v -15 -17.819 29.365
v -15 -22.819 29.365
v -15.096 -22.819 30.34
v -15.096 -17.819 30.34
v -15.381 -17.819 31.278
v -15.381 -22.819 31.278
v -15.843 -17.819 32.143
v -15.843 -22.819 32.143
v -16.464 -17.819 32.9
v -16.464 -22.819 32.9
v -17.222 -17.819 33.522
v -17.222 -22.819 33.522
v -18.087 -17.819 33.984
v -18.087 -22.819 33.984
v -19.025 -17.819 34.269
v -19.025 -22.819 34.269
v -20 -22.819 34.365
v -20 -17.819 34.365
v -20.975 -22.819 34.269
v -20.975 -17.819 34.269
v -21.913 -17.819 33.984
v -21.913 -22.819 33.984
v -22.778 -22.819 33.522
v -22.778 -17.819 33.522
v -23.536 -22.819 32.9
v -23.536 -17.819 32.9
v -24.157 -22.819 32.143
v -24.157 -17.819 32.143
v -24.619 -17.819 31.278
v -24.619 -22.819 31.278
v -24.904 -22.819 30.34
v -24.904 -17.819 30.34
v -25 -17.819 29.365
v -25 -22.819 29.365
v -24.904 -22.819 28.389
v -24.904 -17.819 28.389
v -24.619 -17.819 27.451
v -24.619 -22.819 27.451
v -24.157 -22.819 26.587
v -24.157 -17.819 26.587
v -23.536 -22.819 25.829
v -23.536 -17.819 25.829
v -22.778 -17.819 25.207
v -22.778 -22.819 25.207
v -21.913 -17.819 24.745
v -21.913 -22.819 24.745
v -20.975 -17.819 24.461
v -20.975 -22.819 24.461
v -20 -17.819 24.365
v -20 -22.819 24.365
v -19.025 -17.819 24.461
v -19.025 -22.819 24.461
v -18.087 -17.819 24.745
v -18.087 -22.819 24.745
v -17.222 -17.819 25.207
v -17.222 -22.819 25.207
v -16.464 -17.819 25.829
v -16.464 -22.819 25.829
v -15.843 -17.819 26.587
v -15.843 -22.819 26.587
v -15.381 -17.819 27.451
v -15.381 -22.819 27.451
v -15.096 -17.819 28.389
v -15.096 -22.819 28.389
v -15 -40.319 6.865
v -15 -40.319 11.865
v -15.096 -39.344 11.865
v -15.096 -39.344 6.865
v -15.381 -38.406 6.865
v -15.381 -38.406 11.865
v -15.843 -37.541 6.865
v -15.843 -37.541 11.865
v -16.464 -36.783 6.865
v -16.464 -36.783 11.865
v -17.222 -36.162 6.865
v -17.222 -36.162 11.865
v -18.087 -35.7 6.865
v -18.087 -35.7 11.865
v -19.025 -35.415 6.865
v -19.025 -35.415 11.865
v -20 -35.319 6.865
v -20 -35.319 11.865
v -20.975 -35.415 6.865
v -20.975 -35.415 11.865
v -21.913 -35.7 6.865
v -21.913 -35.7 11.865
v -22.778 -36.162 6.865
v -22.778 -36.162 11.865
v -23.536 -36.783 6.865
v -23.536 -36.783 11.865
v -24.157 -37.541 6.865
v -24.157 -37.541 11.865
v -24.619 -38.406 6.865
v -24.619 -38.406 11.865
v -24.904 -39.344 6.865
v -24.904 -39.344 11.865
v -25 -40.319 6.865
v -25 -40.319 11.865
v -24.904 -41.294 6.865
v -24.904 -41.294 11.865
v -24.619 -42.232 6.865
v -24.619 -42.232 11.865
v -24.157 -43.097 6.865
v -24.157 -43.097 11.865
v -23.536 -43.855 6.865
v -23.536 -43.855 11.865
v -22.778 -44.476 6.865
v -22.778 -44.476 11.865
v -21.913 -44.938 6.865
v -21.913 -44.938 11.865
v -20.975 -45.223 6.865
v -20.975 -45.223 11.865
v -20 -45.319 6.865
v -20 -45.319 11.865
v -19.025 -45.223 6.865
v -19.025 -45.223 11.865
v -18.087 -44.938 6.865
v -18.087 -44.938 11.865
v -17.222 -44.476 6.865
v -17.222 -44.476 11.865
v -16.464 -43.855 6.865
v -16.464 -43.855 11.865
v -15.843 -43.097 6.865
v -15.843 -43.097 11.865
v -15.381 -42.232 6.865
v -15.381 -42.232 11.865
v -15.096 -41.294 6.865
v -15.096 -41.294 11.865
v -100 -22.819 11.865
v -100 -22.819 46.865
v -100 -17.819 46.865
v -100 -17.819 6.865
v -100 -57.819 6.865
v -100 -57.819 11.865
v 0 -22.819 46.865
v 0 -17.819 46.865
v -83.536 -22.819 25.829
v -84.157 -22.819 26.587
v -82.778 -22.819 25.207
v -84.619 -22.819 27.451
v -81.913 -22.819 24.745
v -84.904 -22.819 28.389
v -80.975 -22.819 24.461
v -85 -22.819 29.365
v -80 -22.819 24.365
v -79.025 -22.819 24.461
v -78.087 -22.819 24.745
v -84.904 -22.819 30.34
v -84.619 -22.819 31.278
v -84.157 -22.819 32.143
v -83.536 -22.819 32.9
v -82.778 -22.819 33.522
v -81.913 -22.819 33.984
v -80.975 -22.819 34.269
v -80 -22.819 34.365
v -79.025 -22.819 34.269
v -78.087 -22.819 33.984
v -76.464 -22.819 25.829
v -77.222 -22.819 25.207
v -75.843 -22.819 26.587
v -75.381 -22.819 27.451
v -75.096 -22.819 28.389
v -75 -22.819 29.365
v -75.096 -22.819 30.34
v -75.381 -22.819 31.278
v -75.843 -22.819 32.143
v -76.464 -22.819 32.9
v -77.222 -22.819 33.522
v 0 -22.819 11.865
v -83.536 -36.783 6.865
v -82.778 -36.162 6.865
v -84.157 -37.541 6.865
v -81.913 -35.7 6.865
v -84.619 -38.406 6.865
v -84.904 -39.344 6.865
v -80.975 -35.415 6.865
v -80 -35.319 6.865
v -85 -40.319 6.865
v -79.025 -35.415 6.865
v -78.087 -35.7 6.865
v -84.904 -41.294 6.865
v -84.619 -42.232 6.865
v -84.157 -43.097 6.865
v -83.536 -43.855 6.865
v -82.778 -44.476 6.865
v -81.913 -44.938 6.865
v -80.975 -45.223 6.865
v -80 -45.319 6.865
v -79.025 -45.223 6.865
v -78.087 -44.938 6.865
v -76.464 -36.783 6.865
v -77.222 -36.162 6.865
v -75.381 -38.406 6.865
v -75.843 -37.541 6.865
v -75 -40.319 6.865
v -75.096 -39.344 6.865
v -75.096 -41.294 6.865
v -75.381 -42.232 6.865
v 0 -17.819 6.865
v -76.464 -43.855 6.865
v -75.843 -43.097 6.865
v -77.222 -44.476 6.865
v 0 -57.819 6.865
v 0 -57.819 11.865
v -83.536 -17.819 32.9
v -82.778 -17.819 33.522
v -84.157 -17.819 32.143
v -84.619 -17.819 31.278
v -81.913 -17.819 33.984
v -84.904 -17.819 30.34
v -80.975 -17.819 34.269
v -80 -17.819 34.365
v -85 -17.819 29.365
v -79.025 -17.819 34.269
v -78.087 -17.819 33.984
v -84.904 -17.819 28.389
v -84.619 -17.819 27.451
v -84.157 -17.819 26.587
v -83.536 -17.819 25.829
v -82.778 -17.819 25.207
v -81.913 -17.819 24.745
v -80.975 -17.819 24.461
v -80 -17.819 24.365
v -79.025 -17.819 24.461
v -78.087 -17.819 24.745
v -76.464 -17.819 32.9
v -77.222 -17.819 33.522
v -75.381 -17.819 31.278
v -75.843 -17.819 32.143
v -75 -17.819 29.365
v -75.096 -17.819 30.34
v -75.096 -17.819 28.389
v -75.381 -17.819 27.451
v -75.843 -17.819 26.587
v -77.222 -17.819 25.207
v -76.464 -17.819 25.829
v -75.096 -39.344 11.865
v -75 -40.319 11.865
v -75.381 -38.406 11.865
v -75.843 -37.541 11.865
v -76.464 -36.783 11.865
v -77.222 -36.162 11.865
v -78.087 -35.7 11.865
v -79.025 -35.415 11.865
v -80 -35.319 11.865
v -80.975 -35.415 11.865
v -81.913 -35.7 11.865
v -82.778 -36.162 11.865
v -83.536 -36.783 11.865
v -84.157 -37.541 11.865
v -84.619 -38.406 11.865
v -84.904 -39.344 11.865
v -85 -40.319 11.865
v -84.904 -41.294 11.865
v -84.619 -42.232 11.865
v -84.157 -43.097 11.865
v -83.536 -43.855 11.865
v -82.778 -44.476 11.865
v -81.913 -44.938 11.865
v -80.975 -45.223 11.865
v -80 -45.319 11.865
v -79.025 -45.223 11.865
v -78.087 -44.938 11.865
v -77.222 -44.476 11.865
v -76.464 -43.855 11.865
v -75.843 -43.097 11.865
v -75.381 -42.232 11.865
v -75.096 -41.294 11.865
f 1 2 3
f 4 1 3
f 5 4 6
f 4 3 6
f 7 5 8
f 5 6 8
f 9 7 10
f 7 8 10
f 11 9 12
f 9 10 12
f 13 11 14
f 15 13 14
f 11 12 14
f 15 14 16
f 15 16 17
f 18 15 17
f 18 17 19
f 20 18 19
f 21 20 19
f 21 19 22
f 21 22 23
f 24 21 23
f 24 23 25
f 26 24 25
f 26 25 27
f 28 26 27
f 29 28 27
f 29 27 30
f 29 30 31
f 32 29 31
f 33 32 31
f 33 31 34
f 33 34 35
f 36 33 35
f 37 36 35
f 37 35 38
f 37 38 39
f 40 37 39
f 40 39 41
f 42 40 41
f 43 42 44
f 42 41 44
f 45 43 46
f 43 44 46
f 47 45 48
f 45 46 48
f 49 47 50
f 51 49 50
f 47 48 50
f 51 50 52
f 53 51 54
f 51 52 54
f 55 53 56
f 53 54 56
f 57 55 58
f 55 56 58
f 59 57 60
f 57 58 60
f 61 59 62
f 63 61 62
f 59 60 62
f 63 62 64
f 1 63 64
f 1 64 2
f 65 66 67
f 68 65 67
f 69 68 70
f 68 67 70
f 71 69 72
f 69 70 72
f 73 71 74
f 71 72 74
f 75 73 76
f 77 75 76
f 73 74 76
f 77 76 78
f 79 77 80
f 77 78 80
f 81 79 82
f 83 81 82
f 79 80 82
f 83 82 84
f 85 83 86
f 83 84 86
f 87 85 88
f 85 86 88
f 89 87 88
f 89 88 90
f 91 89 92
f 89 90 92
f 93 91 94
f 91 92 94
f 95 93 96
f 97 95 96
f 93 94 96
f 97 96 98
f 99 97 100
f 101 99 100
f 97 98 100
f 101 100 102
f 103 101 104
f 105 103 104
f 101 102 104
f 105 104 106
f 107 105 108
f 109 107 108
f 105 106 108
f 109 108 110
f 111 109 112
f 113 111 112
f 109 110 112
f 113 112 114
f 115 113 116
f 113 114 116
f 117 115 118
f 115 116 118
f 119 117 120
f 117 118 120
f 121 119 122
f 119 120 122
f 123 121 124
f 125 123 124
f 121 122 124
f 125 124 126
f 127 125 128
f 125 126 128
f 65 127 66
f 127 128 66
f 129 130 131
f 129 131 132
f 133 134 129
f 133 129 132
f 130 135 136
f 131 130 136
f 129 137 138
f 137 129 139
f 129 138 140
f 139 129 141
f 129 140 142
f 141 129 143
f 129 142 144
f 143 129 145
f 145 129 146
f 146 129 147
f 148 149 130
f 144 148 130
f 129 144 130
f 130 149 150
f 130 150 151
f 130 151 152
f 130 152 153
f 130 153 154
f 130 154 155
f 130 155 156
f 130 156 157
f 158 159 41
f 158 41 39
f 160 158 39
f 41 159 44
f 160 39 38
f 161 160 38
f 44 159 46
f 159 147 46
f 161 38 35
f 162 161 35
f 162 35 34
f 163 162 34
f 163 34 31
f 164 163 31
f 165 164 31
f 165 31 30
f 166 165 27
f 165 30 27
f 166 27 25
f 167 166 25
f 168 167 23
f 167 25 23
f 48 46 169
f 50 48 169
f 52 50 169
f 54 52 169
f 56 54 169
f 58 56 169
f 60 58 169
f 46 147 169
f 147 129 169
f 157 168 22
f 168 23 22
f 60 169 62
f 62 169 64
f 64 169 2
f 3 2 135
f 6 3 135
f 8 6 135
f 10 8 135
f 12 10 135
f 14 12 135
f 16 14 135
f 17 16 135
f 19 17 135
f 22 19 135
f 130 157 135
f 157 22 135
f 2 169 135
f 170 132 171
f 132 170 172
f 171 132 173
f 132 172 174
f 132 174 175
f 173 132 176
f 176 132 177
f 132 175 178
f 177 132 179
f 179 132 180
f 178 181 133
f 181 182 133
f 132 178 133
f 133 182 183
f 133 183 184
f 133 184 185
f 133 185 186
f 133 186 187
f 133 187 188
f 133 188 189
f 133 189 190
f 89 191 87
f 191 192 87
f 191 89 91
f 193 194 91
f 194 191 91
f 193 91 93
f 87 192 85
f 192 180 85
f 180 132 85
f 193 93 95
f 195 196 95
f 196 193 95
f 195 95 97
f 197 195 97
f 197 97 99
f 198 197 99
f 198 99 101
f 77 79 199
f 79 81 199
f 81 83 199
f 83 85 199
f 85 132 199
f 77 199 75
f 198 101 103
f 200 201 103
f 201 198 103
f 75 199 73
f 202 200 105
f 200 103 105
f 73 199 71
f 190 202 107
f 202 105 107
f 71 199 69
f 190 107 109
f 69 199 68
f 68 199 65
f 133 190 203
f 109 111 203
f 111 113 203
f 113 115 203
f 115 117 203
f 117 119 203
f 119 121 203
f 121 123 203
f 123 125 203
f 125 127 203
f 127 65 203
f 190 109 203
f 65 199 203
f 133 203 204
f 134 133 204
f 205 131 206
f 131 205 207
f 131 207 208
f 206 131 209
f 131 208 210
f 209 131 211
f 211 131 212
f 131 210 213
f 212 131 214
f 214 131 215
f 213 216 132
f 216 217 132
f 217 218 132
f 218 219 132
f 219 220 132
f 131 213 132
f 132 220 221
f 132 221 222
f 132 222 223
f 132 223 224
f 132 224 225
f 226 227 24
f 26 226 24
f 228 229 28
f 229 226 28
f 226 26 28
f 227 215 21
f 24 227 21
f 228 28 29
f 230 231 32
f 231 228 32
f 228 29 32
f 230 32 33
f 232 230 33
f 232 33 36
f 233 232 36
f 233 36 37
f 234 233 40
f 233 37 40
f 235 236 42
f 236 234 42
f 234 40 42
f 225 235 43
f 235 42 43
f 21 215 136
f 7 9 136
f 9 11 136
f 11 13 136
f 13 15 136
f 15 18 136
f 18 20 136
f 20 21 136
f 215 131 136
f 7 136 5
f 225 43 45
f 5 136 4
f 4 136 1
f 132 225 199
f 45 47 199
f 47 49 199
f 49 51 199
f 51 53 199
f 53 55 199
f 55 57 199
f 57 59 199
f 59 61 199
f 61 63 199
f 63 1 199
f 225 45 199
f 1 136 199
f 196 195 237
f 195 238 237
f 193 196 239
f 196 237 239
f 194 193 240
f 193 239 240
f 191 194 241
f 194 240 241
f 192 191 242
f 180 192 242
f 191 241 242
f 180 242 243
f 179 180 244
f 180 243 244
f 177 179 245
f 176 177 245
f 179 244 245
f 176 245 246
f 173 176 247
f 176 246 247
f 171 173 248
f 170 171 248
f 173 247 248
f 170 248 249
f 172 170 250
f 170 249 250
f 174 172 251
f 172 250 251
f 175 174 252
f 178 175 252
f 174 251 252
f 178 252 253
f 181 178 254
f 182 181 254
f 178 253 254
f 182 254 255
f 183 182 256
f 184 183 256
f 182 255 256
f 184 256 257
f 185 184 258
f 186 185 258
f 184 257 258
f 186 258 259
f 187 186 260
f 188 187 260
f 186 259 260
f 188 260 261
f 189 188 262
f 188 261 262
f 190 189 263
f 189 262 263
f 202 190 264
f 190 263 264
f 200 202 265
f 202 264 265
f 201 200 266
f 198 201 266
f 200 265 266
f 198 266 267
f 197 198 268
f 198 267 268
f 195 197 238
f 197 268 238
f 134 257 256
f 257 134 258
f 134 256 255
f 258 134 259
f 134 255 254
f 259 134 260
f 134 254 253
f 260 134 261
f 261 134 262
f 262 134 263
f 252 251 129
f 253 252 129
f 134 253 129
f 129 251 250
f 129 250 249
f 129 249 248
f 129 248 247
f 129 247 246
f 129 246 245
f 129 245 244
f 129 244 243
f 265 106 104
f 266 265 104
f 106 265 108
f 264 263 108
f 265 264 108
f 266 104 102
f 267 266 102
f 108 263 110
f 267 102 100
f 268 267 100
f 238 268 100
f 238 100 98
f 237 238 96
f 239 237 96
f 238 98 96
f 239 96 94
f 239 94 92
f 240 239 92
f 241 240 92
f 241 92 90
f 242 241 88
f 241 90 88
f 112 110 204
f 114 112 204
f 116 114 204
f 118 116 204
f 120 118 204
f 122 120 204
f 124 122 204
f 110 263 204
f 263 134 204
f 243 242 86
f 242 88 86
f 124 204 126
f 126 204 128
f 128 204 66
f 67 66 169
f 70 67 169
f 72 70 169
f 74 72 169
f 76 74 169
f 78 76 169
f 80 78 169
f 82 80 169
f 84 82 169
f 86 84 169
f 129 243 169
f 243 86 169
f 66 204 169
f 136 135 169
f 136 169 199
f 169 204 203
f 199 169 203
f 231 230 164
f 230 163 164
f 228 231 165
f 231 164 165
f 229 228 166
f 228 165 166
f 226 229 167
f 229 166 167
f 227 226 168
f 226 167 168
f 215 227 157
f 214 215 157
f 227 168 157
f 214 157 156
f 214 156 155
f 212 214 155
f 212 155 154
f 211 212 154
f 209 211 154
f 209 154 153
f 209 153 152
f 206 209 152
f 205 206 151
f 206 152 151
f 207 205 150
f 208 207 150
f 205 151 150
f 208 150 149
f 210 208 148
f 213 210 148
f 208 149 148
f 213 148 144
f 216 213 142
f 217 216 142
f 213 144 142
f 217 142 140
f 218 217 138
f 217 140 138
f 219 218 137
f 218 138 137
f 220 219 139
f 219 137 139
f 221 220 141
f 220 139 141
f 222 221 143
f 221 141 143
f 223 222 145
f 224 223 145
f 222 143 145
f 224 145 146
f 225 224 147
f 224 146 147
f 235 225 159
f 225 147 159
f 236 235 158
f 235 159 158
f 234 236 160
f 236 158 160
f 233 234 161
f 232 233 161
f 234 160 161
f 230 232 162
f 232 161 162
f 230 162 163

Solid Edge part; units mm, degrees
sketch "Sketch1" plane through (0, 0, 0) normal (1, 0, 0) x (0, 1, 0)
  line L0 (-17.8191, 46.8648) -> (-17.8191, 6.8648)
  line L1 (-17.8191, 6.8648) -> (-57.8191, 6.8648)
  line L2 (-57.8191, 6.8648) -> (-57.8191, 11.8648)
  line L3 (-57.8191, 11.8648) -> (-22.8191, 11.8648)
  line L4 (-22.8191, 11.8648) -> (-22.8191, 46.8648)
  line L5 (-22.8191, 46.8648) -> (-17.8191, 46.8648)
  dimension "D1" = 5
  dimension "D2" = 5
  dimension "D3" = 40
  dimension "D4" = 40
extrude "Protrusion1" add sketch "Sketch1" against normal blind 100
sketch "Sketch2" plane through (-50, -22.8191, 29.3648) normal (0, -1, 0) x (1, 0, 0)
  circle A0 centre (30, 0) radius 5
  circle A1 centre (-30, 0) radius 5
  dimension "D1" = 10
  dimension "D2" = 60
  dimension "D3" = 30
extrude "Cutout1" cut sketch "Sketch2" against normal through all
mirror "Mirror1" about plane through (-50, -35.1934, 24.2392) normal (0, -0.7071, -0.7071) of "Cutout1"
